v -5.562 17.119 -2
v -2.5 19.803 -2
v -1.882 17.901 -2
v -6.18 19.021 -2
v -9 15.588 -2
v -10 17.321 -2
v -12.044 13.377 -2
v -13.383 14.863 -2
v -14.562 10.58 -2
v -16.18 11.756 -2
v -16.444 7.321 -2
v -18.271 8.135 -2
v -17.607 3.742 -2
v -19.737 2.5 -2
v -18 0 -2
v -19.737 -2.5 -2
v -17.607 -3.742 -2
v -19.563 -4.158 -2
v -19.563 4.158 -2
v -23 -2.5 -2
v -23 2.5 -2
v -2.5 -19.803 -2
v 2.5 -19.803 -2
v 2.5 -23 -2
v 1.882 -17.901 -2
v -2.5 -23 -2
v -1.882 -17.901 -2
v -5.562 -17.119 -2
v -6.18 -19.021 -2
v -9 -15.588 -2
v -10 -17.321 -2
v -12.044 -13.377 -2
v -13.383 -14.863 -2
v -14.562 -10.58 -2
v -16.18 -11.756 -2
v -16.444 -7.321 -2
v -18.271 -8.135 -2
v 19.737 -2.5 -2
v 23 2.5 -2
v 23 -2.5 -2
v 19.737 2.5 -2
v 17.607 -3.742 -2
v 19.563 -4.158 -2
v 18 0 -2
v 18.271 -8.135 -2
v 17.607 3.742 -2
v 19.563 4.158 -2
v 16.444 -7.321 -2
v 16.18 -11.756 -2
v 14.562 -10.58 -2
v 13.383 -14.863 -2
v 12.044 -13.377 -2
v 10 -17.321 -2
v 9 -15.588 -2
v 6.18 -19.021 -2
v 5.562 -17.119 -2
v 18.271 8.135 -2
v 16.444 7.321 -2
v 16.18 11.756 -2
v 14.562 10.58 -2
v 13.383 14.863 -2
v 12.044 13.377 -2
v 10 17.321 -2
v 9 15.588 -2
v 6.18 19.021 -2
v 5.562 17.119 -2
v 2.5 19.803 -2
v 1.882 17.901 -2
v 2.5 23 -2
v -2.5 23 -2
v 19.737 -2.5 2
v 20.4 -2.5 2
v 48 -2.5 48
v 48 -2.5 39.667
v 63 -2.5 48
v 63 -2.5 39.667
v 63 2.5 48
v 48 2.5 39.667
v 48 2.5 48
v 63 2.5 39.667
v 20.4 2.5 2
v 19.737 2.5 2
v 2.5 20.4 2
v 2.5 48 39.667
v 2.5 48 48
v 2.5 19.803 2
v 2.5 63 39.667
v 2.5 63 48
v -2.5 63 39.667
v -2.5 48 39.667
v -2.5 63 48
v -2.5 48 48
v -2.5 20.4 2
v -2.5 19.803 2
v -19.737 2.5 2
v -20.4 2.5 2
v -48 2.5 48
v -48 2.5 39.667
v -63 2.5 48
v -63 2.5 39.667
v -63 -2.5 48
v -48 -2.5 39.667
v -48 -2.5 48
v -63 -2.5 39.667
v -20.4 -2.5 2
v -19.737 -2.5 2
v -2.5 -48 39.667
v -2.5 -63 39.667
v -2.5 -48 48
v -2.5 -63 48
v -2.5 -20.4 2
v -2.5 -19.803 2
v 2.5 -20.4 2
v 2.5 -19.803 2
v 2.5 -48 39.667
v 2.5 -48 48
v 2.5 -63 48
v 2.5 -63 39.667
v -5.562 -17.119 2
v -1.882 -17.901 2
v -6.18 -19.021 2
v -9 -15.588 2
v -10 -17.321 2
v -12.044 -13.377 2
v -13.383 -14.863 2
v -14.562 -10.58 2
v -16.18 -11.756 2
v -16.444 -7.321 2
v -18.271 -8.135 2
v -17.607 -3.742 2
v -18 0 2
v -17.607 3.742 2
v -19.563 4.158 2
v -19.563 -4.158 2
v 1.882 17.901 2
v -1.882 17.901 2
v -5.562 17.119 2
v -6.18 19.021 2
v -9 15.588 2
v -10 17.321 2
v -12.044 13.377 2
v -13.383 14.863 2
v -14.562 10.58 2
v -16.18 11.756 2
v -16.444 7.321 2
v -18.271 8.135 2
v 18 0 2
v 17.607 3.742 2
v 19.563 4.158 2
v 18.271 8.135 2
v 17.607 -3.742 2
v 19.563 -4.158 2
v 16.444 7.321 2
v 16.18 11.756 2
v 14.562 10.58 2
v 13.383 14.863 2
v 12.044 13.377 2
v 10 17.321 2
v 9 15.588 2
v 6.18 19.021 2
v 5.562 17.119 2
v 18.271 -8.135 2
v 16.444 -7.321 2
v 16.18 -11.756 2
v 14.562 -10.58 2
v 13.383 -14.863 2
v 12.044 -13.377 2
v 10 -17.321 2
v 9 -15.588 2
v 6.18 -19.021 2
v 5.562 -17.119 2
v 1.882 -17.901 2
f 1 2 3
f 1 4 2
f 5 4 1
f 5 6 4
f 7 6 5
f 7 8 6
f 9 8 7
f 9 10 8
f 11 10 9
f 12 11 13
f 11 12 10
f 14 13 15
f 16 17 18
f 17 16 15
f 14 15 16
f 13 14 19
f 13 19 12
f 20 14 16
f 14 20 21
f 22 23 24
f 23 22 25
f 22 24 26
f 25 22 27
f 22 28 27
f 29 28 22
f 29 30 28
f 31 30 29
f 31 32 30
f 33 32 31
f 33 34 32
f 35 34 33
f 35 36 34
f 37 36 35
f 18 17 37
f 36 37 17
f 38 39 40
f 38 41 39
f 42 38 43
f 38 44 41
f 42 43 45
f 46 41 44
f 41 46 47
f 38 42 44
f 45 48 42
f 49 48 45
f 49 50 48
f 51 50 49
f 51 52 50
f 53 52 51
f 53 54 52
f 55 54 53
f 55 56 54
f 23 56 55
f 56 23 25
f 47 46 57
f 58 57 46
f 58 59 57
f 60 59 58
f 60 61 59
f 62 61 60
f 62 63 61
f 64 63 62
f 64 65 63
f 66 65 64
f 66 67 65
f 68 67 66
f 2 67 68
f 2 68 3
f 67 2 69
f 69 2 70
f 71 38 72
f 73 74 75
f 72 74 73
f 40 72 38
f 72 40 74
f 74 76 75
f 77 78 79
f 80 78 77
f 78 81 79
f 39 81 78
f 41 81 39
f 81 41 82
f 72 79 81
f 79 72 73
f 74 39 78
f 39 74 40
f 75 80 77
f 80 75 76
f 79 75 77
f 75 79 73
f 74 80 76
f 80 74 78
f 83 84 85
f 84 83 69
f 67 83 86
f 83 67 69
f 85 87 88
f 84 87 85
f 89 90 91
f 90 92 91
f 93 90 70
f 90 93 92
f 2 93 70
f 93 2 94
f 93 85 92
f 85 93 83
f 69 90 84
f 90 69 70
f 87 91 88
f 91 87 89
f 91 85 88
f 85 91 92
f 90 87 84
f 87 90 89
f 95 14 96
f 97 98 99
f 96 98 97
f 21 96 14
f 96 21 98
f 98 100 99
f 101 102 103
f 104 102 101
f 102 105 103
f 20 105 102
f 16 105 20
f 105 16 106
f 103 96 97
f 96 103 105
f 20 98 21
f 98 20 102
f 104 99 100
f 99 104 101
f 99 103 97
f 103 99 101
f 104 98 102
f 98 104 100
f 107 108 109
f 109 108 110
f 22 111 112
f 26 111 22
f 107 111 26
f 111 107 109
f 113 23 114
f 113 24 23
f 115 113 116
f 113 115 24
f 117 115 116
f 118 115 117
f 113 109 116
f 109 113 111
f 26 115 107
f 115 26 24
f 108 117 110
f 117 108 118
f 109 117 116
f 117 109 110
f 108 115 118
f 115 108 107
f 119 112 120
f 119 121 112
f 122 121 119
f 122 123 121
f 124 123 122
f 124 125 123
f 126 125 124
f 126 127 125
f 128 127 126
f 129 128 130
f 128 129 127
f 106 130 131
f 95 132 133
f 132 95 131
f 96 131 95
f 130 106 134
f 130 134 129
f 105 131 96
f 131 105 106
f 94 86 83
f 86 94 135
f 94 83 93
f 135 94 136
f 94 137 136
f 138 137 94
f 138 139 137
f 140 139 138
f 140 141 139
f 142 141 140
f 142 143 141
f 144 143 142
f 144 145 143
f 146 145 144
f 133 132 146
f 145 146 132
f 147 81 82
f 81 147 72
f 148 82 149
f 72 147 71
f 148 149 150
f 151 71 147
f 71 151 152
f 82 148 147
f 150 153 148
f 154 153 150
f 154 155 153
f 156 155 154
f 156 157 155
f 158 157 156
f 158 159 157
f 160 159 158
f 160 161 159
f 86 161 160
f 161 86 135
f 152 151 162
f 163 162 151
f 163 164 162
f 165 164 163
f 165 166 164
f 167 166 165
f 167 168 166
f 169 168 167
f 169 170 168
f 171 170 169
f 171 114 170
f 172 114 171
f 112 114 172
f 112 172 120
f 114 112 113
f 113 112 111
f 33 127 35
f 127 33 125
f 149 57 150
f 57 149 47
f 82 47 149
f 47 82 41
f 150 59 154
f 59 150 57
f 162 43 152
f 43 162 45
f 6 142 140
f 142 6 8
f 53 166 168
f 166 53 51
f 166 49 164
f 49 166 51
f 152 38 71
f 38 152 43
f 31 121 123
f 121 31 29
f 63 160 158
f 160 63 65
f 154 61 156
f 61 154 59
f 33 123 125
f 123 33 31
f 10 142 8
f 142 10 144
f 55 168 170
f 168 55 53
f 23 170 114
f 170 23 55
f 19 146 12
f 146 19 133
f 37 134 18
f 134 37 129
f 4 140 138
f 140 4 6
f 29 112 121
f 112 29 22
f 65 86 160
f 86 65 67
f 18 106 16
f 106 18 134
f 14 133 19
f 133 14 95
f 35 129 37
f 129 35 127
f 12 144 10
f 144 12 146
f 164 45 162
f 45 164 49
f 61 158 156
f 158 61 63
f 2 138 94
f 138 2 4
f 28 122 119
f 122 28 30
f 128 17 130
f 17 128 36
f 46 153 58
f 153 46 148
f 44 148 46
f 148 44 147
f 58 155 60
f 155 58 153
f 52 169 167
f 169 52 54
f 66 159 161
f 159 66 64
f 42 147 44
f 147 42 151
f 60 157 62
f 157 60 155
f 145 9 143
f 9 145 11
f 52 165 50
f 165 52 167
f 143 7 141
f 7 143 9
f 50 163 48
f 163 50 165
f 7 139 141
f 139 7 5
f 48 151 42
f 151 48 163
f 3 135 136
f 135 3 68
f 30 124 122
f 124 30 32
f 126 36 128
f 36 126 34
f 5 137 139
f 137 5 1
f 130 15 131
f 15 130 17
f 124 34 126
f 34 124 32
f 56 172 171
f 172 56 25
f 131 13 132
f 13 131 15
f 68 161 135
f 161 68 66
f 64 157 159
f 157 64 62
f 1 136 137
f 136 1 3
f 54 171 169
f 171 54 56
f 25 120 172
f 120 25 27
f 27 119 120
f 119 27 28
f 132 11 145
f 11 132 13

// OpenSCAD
module ring(height, radius, ringWidth) {
  difference() {
    color("purple") cylinder(h=height, r=radius, center=true);
    color("red") cylinder(h=height, r=radius - ringWidth, center=true);
  }
}

module triangle(base, height, thickness) {
  points = [
    [0, 0, 0], //0
    [base, 0, 0], //1
    [base, thickness, 0], //2
    [0, thickness, 0], //3
    [0, 0, 0], //4
    [base, 0, height], //5
    [base, thickness, height], //6
    [0, thickness, 0], // 7
  ];

  faces = [
    [0, 1, 2, 3], // bottom
    [4, 5, 1, 0], // front
    [7, 6, 5, 4], // top
    [5, 6, 2, 1], // right
    [6, 7, 3, 2], // back
    [7, 4, 0, 3], // left
  ];
  polyhedron(points=points, faces=faces);
}

module spoke(base, height, thickness, spokeThickness) {
  difference() {
    color("blue") triangle(base=base, height=height, thickness=thickness);
    color("pink") translate([spokeThickness, 0, 0]) triangle(base=base, height=height, thickness=thickness);
  }
  spokeHeightBegin = (height / base) * (base - spokeThickness);
  color("orange") translate([base, 0, spokeHeightBegin]) cube([15, thickness, height - spokeHeightBegin]);
}

radius = 20;
height = 4;
thickness = 5;

spokeBase = 30;
spokeHeight = 50;
spokeThickness = 5;

nSpokes = 4;
for (i=[0:nSpokes]) {
rotate([0, 0, i*(360/nSpokes)]) translate([radius - 2, -1 * (thickness / 2), -1 * height / 2]) cube(size=[5, 5, 4]);
rotate([0, 0, i*(360/nSpokes)]) translate([radius - 2, -1 * (thickness / 2), -1 * height / 2]) spoke(base=spokeBase, height=spokeHeight, thickness=thickness, spokeThickness=spokeThickness);  
}


// rotate([0, 0, 120]) translate([radius - 2, -1 * (thickness / 2), -1 * height / 2]) cube(size=[8, 5, 4]);
// rotate([0, 0, 120]) translate([radius - 2, -1 * (thickness / 2), -1 * height / 2]) spoke(base=spokeBase, height=spokeHeight, thickness=thickness, spokeThickness=spokeThickness);
// rotate([0, 0, 240]) translate([radius - 2, -1 * (thickness / 2), -1 * height / 2]) cube(size=[8, 5, 4]);
// rotate([0, 0, 240]) translate([radius - 2, -1 * (thickness / 2), -1 * height / 2]) spoke(base=spokeBase, height=spokeHeight, thickness=thickness, spokeThickness=spokeThickness);
ring(height, radius, 2);
